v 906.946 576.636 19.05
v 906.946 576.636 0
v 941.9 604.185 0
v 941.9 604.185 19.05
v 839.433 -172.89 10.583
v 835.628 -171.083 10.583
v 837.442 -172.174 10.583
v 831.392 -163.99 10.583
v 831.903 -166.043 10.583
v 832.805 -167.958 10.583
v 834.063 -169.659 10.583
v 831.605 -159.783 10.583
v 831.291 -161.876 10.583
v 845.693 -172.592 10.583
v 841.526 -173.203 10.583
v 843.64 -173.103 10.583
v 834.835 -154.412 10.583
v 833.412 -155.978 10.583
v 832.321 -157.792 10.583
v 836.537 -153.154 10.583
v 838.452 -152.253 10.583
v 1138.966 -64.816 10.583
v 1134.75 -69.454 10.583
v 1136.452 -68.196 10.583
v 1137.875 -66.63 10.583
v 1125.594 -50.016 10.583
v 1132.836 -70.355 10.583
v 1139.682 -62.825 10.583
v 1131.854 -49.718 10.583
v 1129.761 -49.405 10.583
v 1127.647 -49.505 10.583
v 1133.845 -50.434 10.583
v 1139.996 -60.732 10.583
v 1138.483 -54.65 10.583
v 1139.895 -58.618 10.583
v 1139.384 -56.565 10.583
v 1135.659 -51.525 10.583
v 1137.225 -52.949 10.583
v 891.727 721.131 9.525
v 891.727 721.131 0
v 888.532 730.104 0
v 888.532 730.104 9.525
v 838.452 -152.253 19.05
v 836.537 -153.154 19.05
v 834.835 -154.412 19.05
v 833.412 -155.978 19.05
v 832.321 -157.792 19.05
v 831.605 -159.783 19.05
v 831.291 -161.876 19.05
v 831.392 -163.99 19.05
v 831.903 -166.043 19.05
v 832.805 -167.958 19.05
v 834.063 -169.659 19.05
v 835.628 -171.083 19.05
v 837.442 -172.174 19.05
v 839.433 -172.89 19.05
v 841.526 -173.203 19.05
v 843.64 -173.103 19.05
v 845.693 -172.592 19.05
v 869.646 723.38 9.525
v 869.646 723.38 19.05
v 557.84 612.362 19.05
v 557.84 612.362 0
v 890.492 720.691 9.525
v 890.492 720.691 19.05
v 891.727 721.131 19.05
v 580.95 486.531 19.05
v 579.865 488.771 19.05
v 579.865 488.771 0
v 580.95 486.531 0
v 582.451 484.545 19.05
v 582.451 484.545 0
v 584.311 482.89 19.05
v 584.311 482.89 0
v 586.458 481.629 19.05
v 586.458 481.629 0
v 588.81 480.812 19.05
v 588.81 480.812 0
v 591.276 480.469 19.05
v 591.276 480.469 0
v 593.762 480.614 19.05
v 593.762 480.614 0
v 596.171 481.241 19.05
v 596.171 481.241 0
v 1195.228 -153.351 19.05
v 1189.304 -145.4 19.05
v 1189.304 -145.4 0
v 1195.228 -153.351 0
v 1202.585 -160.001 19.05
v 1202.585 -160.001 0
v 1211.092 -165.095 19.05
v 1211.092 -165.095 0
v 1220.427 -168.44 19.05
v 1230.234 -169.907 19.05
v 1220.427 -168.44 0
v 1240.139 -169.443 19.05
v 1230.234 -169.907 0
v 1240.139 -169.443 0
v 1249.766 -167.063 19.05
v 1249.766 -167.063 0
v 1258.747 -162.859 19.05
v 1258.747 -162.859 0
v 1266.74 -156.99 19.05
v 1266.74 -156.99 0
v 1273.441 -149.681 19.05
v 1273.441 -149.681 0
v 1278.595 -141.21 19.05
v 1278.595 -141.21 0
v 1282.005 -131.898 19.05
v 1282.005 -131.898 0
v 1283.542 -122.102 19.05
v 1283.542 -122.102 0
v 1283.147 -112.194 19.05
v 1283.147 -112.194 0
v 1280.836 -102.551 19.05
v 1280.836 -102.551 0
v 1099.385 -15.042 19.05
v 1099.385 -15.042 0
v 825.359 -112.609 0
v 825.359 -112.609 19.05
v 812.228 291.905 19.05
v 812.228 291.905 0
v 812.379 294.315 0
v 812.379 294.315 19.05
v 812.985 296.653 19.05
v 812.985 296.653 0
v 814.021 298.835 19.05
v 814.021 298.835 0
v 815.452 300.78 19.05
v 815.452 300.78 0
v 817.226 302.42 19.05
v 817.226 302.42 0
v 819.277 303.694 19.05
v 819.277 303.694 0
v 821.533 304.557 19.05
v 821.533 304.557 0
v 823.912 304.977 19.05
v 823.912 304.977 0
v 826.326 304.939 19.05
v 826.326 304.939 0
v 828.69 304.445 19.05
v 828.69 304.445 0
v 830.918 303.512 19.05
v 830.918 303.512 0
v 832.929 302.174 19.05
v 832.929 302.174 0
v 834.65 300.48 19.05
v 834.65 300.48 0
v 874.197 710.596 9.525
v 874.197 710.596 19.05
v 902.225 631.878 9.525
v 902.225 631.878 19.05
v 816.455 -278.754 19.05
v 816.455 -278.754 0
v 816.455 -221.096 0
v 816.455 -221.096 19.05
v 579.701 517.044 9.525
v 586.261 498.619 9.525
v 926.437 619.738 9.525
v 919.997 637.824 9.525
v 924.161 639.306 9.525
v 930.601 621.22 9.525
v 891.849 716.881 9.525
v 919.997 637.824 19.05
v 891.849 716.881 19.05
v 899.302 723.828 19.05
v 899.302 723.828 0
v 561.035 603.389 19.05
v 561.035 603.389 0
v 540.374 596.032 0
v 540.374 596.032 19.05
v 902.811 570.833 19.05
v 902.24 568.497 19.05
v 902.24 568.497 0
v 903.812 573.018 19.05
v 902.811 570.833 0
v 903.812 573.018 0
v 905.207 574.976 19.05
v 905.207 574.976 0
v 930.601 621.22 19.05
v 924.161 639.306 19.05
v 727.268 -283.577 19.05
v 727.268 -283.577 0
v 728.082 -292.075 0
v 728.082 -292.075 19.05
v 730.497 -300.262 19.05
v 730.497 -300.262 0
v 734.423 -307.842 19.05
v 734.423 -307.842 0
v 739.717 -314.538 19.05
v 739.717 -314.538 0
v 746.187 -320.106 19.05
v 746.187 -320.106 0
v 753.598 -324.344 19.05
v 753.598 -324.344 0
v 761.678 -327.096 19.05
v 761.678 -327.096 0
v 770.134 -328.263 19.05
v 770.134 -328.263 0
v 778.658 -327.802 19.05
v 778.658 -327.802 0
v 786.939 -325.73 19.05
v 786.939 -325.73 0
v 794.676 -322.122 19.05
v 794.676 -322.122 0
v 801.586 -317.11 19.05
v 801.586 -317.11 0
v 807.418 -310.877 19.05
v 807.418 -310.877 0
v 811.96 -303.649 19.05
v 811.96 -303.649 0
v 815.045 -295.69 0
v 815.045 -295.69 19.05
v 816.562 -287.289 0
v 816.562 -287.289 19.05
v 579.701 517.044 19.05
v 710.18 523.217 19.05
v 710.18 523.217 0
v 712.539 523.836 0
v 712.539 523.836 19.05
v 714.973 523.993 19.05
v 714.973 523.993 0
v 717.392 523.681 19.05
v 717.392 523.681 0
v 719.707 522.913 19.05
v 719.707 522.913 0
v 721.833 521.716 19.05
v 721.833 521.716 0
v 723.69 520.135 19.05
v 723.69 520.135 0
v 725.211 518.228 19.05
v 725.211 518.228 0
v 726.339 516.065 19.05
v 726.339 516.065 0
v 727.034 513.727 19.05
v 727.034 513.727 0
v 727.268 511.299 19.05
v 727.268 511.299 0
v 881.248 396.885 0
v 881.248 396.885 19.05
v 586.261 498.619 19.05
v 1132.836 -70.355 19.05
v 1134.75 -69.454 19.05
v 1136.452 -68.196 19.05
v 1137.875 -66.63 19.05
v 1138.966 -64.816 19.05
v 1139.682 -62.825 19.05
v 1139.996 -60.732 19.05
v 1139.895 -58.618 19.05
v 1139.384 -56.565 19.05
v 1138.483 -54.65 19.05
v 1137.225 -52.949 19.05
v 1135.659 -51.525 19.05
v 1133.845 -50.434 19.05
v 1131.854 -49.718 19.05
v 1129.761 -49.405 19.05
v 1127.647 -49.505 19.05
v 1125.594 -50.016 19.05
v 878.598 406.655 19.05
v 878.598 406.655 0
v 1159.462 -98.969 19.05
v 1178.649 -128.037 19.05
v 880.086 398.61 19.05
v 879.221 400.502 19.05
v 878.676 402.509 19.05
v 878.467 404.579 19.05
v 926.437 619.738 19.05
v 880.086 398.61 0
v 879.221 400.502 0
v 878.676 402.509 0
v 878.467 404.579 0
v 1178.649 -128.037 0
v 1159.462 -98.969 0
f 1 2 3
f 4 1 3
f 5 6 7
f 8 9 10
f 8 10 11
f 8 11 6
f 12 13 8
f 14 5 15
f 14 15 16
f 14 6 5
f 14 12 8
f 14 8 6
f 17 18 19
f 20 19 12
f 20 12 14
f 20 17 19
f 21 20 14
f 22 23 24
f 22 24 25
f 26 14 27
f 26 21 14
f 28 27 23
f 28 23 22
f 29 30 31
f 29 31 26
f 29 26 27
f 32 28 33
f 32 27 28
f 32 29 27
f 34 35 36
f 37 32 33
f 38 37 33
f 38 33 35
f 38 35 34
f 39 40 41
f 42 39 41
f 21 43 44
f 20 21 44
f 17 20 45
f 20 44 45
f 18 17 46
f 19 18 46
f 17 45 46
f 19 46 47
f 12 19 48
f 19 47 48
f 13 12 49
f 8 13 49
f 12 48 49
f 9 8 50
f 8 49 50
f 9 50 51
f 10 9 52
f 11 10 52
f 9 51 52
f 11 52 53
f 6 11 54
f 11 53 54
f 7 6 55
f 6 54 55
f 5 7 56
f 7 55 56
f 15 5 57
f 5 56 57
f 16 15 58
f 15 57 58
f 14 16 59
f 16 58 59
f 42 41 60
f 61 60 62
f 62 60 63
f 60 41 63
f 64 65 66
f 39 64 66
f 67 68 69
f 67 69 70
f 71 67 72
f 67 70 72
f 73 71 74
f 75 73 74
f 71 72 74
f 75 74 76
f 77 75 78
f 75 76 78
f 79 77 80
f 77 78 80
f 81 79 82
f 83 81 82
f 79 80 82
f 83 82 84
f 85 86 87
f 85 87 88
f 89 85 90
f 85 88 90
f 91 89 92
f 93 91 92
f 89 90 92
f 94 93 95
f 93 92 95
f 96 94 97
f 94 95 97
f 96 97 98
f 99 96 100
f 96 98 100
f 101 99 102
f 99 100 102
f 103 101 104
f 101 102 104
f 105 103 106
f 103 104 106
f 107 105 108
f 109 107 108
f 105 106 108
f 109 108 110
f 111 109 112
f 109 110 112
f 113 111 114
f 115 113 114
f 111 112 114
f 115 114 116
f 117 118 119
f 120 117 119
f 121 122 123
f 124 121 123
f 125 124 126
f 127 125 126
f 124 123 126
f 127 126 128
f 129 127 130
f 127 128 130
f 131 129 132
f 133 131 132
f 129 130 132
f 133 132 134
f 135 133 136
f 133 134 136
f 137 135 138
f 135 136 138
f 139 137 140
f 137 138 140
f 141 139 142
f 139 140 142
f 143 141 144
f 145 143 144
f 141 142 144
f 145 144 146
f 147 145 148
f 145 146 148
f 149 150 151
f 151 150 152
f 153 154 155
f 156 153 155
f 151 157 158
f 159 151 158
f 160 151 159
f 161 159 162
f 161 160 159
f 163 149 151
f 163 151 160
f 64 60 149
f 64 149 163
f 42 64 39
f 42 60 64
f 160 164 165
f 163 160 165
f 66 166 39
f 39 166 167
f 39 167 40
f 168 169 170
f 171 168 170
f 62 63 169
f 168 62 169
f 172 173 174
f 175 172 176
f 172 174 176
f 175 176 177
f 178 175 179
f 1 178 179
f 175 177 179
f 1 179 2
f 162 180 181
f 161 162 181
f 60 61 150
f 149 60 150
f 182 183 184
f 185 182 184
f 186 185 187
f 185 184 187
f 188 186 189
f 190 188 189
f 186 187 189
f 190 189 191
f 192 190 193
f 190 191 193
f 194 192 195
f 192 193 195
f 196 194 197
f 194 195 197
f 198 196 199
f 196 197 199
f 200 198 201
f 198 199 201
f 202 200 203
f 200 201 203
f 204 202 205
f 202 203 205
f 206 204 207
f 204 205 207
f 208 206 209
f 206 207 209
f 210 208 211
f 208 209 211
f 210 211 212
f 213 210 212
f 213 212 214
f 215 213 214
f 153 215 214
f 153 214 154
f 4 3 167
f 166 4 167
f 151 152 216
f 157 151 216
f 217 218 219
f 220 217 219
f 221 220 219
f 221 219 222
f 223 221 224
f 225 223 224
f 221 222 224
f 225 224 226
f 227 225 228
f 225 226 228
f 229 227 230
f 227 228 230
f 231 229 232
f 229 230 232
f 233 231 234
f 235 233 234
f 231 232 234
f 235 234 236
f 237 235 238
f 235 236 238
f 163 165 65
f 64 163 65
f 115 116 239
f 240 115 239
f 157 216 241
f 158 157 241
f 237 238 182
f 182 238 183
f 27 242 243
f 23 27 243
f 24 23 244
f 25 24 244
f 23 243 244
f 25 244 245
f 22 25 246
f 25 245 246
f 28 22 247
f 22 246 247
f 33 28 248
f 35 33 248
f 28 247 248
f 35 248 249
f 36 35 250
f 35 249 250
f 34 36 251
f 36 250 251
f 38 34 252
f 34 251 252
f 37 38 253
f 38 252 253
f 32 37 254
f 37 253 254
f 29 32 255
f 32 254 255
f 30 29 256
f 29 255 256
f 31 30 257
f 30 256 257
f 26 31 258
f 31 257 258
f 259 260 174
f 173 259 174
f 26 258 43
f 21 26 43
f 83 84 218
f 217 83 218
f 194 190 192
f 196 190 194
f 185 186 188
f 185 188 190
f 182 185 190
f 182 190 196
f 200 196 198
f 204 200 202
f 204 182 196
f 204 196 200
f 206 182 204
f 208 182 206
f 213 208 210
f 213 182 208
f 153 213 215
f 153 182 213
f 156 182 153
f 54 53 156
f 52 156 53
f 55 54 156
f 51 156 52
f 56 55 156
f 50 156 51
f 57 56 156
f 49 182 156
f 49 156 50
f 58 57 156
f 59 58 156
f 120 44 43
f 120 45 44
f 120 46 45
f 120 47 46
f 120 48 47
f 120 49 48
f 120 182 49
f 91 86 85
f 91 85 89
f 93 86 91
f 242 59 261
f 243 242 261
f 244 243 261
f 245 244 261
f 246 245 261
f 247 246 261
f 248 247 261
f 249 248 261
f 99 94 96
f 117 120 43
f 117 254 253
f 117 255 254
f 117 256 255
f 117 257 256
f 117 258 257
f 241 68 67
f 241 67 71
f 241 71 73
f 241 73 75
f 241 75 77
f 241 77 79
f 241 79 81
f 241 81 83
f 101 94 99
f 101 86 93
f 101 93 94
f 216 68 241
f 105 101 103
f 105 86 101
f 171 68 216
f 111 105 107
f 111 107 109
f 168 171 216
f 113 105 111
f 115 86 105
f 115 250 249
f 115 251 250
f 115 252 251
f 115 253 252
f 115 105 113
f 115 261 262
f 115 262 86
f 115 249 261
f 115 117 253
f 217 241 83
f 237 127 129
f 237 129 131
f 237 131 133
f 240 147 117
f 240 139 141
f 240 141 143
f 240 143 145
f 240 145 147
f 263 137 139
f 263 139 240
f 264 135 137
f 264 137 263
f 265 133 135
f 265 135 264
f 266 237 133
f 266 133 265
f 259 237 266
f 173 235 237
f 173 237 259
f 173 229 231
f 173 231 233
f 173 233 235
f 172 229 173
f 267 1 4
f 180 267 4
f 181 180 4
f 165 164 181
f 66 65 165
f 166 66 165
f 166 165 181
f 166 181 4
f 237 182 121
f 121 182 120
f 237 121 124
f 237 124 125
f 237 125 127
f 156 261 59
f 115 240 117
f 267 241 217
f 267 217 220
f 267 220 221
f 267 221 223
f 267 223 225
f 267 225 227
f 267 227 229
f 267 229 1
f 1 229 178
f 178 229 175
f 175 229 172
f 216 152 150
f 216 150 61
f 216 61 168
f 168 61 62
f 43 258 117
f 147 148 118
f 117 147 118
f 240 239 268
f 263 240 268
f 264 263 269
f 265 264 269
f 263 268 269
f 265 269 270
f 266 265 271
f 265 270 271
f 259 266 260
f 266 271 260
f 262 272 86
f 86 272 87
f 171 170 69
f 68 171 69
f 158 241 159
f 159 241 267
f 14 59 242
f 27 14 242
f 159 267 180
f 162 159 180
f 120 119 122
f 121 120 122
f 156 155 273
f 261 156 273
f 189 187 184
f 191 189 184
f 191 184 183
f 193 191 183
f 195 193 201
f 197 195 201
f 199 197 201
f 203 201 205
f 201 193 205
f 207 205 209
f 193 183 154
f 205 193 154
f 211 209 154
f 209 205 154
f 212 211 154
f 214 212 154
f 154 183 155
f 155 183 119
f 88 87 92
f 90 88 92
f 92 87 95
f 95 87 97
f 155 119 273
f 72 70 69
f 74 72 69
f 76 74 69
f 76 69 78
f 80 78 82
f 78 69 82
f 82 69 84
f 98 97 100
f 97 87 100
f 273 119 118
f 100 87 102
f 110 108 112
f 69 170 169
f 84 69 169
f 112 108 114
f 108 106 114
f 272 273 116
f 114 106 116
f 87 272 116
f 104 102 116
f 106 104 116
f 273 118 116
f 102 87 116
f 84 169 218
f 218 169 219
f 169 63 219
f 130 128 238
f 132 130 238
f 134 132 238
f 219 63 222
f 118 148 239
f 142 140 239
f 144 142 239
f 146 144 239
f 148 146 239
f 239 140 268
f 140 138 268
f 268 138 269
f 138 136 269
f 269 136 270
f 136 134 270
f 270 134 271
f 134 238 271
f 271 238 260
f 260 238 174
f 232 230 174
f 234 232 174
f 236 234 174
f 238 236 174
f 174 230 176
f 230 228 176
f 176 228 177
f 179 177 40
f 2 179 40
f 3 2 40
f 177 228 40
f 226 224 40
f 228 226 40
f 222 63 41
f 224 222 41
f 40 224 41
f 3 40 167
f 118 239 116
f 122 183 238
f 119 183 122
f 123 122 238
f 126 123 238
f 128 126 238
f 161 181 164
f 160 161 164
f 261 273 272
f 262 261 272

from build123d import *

# Parameters (mm, degrees)
F1_DEPTH = 19.05
F3_DEPTH = 8.4666582
F5_DEPTH = 9.525


# Not quite as in the source:
# - a feature names something its author has since deleted; it is built from what else it names


with BuildPart() as f1:
    # F0 (on Top) → F1 (new body)
    with BuildSketch(Plane.XY):
        with BuildLine():
            Line((727.2677384075, 427.9083177516), (727.2677384075, -283.5772421425))
            ThreePointArc((727.2677384075, -283.5772421425), (774.4074471785, -328.2362889839), (816.4554812019, -278.7535097314))
            Line((816.4554812019, -278.7535097314), (816.4554812019, -221.0955097314))
            Line((816.4554812019, -221.0955097314), (1159.4623036636, -98.9686407408))
            Line((1159.4623036636, -98.9686407408), (1178.6487772739, -128.0367093729))
            Line((1178.6487772739, -128.0367093729), (1189.3036458742, -145.3996676047))
            ThreePointArc((1189.3036458742, -145.3996676047), (1254.3589120262, -165.180351508), (1280.8355912672, -102.5508970465))
            Line((1280.8355912672, -102.5508970465), (881.2480453078, 396.8848219998))
            ThreePointArc((881.2480453078, 396.8848219998), (878.9075846932, 401.4943033077), (878.5980767553, 406.6546597539))
            Line((878.5980767553, 406.6546597539), (902.2401524871, 568.497452094))
            ThreePointArc((902.2401524871, 568.497452094), (903.8120375637, 573.0182606597), (906.9455405898, 576.6362285378))
            Line((906.9455405898, 576.6362285378), (941.9003890149, 604.1852707886))
            Line((941.9003890149, 604.1852707886), (899.3018677789, 723.8279303566))
            Line((899.3018677789, 723.8279303566), (891.7270738587, 721.1309406639))
            Line((891.7270738587, 721.1309406639), (888.532184766, 730.1041401315))
            Line((888.532184766, 730.1041401315), (557.8398737201, 612.361827435))
            Line((557.8398737201, 612.361827435), (561.0347628128, 603.3886279674))
            Line((561.0347628128, 603.3886279674), (540.3738890749, 596.0323666485))
            Line((540.3738890749, 596.0323666485), (579.8650741531, 488.7713005475))
            ThreePointArc((579.8650741531, 488.7713005475), (586.4584656719, 481.6292642269), (596.1708798397, 481.2413137672))
            Line((596.1708798397, 481.2413137672), (710.1798289544, 523.2169221936))
            ThreePointArc((710.1798289544, 523.2169221936), (721.8328450807, 521.7157540947), (727.2677384075, 511.2990259602))
            Line((727.2677384075, 511.2990259602), (727.2677384075, 427.9083177516))
        make_face()
        with BuildLine():
            Line((1099.3852571882, -15.0422832395), (825.3589785984, -112.6087723988))
            Line((825.3589785984, -112.6087723988), (812.2279623998, 291.9047427935))
            ThreePointArc((812.2279623998, 291.9047427935), (820.3847868922, 304.1789193457), (834.6503380579, 300.4798321914))
            Line((834.6503380579, 300.4798321914), (1099.3852571882, -15.0422832395))
        make_face(mode=Mode.SUBTRACT)
    extrude(amount=F1_DEPTH)

    # F2 (on face) → F3 (cut)
    with BuildSketch(Plane.XY.offset(19.05)):
        with BuildLine():
            ThreePointArc((838.451528287, -152.2525984903), (831.9027765287, -166.0430988586), (845.6932768971, -172.5918506169))
            Line((845.6932768971, -172.5918506169), (1132.8356598603, -70.3553996504))
            ThreePointArc((1132.8356598603, -70.3553996504), (1139.3844116185, -56.564899282), (1125.5939112501, -50.0161475238))
            Line((1125.5939112501, -50.0161475238), (838.451528287, -152.2525984903))
        make_face()
    extrude(amount=-F3_DEPTH, mode=Mode.SUBTRACT)

    # F4 (on face) → F5 (cut)
    with BuildSketch(Plane.XY.offset(19.05)):
        Polygon((579.7007303012, 517.0436017545), (586.2609025716, 498.618632181), (926.4367371726, 619.7375338049), (930.6009060633, 621.2201775171), (924.161381266, 639.3062953154), (919.9972123753, 637.8236516032), (891.8491444715, 716.8806143331), (890.4923506062, 720.6913200061), (891.7270738587, 721.1309406639), (888.532184766, 730.1041401315), (869.645537074, 723.3795883228), (874.197220032, 710.5956831823), (902.2246404628, 631.8775722275), align=None)
    extrude(amount=-F5_DEPTH, mode=Mode.SUBTRACT)


solid = f1.part
